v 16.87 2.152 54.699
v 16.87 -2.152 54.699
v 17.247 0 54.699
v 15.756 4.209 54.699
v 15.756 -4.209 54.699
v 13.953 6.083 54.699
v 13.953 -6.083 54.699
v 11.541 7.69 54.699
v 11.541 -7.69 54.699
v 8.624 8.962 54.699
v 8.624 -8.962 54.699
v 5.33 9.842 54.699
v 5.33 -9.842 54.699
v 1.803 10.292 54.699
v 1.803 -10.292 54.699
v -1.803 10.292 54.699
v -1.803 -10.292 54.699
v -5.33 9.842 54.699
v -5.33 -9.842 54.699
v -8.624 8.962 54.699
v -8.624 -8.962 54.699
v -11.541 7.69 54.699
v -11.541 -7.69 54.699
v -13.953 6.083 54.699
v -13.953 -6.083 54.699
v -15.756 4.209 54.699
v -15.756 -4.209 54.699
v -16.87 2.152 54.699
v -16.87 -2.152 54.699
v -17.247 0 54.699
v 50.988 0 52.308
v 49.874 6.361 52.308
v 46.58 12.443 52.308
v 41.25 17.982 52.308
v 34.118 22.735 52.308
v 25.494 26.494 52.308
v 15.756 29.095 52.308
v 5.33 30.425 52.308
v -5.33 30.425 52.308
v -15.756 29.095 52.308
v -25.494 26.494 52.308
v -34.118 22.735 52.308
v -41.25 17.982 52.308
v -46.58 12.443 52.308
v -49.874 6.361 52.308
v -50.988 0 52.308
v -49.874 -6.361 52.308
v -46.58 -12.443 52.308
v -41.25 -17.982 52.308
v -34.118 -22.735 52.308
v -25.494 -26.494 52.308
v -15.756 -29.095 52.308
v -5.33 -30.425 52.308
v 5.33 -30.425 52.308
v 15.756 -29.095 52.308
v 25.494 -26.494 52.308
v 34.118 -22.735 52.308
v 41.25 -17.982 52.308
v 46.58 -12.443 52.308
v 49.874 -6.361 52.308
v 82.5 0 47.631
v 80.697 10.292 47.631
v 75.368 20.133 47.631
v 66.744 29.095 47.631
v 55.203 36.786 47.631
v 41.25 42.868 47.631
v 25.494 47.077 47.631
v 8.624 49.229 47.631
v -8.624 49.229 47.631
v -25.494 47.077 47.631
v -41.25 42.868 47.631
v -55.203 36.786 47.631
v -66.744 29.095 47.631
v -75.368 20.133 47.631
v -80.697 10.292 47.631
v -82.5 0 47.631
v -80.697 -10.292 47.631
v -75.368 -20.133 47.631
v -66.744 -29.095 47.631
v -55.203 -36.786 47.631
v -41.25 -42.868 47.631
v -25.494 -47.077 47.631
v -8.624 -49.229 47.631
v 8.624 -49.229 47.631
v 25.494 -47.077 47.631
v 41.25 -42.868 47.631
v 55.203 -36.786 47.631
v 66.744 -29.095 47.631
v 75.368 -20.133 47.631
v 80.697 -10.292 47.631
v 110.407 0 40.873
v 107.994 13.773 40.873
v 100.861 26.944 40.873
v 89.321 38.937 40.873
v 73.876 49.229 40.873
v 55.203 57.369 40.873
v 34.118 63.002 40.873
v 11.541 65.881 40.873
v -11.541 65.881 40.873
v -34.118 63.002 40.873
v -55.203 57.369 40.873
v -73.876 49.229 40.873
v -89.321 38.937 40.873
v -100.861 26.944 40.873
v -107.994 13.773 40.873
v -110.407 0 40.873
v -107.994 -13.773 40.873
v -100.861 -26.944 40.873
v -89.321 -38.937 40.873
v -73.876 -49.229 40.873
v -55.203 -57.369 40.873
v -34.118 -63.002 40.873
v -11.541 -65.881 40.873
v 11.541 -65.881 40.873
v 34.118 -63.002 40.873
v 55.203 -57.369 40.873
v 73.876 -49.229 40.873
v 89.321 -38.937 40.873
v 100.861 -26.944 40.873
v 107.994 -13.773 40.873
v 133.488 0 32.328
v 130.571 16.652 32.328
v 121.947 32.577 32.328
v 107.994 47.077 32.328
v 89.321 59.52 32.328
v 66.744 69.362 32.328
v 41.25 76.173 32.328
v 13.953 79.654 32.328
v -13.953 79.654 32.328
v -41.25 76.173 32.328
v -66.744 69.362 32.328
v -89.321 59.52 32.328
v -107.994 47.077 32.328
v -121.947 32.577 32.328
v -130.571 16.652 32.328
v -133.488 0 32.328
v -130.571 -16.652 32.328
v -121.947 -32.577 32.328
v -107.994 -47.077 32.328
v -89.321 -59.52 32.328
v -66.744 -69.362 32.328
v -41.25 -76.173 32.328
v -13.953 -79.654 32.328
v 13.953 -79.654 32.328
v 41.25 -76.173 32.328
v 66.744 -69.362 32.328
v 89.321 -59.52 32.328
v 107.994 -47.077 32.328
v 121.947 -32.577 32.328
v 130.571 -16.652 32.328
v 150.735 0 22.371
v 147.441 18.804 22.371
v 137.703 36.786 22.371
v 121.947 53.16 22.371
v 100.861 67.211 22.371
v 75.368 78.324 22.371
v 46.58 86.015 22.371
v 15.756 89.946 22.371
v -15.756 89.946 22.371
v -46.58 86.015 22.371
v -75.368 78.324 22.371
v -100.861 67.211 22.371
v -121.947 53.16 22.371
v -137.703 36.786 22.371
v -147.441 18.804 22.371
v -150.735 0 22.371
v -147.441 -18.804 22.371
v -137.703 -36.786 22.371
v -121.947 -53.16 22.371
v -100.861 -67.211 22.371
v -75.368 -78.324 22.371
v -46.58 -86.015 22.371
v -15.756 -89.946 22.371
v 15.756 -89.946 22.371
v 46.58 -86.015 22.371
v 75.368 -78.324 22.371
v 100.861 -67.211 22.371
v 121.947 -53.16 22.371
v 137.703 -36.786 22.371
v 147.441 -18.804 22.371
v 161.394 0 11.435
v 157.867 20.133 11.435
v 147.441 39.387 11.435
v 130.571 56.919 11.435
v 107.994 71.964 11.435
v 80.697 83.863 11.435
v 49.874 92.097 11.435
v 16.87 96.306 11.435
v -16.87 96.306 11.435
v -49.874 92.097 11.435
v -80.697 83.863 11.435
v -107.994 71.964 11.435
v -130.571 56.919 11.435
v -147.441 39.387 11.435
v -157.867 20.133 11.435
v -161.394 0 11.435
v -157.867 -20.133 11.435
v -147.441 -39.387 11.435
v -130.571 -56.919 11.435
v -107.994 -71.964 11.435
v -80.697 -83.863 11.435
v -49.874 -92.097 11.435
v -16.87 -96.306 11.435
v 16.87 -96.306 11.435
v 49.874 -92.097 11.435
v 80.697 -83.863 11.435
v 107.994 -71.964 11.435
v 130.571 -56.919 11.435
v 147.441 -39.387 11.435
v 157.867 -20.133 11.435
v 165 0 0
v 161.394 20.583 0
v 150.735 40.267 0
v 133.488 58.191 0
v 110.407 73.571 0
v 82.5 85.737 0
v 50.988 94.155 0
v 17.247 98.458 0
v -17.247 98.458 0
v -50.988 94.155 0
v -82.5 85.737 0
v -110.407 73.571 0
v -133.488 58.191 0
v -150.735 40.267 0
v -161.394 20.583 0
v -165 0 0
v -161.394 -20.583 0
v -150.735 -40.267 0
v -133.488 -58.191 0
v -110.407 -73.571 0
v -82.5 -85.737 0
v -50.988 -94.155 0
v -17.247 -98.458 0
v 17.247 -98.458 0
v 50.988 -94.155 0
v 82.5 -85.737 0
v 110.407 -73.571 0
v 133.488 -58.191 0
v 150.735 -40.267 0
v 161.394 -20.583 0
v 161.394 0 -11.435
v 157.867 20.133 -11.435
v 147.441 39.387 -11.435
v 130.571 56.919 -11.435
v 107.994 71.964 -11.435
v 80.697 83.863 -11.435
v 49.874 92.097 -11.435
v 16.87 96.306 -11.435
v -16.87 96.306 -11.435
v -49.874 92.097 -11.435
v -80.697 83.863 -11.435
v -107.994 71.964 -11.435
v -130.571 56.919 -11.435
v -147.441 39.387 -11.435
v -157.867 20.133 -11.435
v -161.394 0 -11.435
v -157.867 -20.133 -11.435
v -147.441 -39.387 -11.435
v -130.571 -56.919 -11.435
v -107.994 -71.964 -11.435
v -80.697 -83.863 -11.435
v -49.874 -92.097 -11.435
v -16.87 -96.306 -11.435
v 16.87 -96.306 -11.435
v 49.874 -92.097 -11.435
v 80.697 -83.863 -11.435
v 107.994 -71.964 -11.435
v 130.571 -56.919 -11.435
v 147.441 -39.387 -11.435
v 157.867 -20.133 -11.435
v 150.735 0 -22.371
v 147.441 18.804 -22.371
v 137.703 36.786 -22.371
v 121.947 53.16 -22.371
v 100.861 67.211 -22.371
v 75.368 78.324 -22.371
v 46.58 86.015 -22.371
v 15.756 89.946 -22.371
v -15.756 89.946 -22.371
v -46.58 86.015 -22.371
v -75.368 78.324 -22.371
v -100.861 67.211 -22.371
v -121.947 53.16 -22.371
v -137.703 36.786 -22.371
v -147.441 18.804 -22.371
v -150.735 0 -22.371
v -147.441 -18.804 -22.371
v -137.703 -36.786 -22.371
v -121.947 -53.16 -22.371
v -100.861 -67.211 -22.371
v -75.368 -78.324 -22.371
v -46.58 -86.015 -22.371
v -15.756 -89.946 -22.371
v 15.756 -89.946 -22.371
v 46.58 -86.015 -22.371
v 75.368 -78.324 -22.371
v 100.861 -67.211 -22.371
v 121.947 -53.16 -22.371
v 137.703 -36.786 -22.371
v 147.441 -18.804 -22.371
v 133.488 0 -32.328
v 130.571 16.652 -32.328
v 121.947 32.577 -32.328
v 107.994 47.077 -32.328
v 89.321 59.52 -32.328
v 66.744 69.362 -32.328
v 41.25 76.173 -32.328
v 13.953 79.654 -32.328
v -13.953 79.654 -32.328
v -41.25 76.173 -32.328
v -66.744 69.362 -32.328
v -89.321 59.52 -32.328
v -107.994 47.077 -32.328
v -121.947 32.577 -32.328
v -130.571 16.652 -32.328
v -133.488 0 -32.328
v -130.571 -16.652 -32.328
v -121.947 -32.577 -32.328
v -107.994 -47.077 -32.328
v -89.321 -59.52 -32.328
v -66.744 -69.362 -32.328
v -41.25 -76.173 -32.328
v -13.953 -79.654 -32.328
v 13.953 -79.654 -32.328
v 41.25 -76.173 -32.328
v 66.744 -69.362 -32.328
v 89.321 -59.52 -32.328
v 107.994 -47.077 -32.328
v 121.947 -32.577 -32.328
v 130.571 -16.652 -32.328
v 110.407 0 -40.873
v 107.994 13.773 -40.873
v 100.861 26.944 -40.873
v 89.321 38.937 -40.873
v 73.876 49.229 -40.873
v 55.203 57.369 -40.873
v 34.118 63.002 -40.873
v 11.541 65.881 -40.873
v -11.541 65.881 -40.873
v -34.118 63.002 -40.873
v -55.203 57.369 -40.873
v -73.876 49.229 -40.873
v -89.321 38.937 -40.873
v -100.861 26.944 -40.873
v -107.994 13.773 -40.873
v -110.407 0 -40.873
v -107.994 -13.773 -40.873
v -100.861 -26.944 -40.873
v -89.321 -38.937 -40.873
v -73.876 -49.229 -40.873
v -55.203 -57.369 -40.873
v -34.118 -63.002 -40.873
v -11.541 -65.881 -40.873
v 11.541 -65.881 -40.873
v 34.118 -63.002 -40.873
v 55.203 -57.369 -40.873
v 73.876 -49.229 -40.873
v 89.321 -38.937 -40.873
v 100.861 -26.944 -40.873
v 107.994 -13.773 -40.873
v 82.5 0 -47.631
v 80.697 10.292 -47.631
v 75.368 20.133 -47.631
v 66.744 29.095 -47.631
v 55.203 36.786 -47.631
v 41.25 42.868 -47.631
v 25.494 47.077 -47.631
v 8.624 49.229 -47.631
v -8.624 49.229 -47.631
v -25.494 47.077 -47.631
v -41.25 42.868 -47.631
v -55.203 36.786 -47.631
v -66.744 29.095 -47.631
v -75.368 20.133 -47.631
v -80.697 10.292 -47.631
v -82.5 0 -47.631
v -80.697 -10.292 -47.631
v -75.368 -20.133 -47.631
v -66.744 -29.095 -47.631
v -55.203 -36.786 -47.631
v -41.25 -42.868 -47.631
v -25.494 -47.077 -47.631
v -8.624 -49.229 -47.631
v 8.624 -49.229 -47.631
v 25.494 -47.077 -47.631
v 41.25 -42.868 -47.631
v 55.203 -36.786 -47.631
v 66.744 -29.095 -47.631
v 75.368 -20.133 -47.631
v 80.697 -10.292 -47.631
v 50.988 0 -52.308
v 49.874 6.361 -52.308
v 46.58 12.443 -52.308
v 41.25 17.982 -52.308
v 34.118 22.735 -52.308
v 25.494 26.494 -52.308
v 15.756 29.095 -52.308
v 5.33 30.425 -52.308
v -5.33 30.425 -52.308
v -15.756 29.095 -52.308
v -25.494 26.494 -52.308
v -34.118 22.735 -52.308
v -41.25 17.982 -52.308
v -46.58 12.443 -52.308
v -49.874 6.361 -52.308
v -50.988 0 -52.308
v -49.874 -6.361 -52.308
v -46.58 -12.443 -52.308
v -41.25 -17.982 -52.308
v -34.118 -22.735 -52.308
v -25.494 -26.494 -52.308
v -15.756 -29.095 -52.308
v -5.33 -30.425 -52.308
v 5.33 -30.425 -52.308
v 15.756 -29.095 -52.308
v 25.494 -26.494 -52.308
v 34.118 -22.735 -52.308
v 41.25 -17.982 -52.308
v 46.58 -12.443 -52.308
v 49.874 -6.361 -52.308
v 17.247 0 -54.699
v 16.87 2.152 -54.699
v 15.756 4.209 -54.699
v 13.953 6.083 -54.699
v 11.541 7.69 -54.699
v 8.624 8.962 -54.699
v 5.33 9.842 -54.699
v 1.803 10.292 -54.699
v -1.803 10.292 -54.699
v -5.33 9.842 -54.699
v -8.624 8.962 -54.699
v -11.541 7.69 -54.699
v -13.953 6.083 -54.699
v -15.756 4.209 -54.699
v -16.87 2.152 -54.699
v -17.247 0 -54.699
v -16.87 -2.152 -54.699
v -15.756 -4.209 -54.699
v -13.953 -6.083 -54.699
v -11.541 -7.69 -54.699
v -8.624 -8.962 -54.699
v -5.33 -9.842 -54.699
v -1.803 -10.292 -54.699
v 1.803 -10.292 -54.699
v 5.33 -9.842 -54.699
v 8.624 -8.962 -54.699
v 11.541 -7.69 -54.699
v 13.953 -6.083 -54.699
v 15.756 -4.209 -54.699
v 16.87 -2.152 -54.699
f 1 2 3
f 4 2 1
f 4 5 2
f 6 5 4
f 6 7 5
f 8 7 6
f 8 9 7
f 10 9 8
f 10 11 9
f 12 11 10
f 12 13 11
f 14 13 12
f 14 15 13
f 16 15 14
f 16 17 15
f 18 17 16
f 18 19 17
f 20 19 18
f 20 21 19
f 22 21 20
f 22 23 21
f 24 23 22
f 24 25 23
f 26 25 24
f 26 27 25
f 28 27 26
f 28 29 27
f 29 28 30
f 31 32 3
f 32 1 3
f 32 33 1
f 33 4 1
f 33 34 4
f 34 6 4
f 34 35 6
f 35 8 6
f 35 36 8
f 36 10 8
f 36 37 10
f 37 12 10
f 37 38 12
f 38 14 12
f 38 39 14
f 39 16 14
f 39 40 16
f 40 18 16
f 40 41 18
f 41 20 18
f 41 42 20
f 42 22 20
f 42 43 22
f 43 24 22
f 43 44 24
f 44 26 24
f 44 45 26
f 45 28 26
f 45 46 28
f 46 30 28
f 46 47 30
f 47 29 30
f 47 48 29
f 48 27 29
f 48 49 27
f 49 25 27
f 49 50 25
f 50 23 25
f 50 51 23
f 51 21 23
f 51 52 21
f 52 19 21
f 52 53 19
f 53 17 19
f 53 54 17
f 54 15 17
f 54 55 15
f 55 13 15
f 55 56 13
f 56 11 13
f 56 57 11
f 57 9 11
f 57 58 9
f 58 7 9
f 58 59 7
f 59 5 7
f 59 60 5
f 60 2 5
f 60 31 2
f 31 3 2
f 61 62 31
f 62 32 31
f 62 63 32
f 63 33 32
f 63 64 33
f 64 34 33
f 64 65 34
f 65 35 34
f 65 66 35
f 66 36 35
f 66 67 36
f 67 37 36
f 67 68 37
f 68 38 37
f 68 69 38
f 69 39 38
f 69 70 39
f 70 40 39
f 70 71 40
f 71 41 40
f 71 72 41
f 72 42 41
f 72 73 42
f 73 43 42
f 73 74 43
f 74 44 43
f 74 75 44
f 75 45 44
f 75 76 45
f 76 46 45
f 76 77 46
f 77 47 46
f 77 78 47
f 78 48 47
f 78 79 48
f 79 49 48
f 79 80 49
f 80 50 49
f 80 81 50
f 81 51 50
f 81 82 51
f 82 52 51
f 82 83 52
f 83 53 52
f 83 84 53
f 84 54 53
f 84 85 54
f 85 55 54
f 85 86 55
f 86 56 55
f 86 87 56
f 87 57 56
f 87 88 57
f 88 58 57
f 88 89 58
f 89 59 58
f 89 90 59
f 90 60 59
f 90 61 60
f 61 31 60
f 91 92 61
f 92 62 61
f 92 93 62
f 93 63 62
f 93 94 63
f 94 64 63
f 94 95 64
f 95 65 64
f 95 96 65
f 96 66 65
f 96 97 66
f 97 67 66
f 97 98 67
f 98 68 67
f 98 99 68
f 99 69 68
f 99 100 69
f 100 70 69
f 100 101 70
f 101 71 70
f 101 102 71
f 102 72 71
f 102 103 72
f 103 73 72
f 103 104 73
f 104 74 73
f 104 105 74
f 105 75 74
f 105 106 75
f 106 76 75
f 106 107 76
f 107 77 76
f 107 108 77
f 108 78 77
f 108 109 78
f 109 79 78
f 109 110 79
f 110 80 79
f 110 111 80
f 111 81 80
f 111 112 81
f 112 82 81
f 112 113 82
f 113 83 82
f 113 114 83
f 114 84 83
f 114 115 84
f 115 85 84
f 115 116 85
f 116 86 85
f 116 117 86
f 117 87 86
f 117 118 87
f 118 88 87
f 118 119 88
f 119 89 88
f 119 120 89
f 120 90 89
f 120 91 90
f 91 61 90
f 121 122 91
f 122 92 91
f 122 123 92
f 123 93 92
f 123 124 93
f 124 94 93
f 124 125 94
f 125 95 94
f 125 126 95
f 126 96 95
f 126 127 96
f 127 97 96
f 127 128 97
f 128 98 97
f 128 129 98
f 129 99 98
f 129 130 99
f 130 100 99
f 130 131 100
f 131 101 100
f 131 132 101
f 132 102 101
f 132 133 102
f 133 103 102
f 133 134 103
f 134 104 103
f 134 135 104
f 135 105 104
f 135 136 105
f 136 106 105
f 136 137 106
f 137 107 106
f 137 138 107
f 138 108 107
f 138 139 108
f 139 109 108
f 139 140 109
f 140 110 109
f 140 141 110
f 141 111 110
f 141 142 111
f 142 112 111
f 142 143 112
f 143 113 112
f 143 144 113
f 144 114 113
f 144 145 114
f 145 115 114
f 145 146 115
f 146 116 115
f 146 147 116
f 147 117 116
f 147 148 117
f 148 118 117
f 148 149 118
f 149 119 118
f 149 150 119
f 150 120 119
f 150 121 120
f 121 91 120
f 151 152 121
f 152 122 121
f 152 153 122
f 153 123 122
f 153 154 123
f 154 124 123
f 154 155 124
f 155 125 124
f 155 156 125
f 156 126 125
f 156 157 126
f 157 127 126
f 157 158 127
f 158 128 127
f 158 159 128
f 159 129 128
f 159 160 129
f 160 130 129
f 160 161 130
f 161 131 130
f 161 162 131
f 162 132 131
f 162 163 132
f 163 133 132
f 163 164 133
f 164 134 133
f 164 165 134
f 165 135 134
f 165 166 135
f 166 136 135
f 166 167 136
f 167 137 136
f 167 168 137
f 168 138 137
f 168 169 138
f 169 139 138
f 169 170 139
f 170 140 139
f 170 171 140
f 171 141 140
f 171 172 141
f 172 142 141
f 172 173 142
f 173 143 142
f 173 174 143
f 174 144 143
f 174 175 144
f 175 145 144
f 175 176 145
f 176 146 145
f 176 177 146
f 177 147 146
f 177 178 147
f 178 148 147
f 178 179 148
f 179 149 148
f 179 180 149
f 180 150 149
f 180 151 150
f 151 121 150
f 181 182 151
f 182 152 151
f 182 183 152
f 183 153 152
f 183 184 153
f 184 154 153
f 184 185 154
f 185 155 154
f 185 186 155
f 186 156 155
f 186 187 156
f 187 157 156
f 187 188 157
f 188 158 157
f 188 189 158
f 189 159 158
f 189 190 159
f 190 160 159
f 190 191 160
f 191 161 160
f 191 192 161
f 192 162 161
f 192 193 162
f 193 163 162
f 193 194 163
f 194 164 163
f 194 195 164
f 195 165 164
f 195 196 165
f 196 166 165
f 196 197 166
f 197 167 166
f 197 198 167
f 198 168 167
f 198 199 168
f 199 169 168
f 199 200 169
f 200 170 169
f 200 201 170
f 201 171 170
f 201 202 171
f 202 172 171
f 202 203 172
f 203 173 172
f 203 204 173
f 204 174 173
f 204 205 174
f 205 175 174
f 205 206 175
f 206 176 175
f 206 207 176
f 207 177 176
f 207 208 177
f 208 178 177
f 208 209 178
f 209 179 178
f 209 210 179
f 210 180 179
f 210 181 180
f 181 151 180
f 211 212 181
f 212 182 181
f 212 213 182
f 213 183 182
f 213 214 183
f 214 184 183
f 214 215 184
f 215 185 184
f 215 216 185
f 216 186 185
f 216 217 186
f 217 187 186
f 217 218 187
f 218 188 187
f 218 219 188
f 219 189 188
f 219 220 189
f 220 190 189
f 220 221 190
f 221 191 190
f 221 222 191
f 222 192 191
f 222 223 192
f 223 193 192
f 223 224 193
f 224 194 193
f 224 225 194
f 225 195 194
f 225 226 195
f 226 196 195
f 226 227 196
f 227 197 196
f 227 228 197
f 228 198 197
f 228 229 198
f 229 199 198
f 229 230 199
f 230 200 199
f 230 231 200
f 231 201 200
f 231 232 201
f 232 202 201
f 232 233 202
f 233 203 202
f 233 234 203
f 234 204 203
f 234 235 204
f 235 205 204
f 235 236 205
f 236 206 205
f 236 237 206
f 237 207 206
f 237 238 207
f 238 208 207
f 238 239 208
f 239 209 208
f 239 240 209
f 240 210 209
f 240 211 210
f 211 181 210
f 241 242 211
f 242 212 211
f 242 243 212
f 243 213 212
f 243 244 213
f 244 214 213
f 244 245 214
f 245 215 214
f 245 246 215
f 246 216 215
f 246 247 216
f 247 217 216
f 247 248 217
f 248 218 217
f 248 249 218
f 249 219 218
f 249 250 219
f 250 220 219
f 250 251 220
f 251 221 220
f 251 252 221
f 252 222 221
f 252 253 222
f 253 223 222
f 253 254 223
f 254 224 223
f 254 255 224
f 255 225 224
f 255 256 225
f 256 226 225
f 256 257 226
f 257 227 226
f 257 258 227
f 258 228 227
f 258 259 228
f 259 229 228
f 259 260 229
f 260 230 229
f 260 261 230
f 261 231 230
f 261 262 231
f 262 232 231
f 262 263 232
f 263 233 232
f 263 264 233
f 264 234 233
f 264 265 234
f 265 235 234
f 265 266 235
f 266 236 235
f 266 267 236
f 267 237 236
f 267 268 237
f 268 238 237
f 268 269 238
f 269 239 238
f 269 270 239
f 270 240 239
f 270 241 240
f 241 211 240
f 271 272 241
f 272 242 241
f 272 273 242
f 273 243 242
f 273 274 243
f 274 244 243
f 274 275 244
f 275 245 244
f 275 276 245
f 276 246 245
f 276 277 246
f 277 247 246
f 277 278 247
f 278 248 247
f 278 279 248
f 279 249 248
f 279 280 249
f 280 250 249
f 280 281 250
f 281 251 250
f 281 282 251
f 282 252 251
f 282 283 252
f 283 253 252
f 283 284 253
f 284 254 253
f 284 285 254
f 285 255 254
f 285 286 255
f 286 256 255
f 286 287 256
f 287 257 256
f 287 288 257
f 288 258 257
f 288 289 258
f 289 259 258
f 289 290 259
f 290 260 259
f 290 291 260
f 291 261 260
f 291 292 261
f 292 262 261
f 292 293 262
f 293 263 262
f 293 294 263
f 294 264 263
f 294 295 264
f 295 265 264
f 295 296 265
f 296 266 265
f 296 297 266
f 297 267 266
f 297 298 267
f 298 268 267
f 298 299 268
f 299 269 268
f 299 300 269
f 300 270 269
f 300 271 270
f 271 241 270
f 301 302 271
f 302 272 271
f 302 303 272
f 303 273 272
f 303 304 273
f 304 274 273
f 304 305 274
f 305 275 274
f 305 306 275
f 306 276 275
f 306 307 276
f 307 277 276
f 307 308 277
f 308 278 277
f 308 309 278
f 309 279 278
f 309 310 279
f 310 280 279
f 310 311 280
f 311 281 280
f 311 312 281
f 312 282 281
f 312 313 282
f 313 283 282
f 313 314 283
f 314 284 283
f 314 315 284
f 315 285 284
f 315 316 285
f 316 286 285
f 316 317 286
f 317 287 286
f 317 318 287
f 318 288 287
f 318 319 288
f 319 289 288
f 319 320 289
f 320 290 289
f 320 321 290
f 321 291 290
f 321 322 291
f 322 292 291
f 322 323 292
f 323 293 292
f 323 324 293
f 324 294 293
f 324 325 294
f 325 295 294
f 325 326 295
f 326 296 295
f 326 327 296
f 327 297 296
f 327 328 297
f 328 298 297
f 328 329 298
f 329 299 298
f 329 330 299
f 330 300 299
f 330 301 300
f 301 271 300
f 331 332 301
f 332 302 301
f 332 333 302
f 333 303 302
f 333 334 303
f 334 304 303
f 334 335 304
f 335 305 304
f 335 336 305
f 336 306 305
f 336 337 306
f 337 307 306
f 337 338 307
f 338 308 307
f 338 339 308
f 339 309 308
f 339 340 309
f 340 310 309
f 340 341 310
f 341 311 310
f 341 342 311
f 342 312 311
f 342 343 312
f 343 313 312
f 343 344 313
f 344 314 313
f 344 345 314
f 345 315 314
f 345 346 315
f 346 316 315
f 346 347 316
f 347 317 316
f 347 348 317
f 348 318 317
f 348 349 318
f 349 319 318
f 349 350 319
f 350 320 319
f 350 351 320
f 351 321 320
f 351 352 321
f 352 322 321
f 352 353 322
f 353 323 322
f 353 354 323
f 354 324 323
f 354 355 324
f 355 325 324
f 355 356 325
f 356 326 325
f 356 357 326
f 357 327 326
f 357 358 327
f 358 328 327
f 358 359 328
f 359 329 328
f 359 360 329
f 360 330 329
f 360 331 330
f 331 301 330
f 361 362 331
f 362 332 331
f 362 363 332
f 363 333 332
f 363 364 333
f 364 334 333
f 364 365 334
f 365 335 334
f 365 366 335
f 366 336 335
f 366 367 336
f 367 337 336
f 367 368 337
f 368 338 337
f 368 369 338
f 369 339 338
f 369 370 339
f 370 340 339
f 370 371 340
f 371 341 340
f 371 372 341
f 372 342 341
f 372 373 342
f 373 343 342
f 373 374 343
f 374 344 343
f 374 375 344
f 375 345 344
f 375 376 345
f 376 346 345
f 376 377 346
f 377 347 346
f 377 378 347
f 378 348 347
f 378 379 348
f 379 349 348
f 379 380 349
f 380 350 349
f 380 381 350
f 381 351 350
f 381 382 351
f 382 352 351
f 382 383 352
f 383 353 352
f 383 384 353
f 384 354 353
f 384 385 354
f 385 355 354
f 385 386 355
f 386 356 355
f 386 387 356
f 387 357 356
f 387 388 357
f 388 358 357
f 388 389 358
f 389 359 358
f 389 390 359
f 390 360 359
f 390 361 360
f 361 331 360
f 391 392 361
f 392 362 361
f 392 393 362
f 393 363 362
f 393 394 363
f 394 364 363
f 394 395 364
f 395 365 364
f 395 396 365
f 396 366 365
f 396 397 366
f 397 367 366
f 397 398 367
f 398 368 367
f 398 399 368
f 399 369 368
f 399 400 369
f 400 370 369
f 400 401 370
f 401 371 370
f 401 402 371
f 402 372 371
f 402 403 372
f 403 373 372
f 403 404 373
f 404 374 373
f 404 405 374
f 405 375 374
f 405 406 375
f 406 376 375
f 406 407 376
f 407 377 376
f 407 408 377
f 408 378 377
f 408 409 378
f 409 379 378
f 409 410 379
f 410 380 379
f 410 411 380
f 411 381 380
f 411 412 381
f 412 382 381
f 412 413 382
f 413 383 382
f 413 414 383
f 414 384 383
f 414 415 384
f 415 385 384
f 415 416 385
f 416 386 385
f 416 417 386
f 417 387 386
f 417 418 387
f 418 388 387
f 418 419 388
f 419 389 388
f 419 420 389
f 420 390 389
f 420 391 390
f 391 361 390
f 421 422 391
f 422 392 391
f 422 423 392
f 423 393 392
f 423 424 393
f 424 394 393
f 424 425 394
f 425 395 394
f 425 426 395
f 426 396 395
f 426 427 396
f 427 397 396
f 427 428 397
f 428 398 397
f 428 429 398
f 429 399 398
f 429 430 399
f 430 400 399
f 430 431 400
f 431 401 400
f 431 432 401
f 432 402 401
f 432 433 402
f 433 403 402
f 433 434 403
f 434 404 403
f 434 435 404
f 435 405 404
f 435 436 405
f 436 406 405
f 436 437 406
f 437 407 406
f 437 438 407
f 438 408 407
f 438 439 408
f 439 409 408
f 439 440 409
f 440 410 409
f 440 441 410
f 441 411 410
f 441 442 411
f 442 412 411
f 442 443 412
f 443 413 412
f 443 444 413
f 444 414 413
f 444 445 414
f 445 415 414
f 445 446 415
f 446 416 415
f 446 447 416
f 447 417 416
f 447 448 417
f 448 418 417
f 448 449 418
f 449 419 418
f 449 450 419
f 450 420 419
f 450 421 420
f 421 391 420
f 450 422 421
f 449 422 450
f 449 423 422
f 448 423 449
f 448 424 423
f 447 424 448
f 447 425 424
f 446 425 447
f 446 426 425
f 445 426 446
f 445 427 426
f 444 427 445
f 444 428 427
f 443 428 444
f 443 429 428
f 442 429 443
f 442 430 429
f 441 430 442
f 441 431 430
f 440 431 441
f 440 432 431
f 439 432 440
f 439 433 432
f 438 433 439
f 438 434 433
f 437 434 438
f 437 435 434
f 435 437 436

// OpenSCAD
// Generated by SolidPython 1.0.1 on 2020-07-29 00:46:51


scale(v = [15, 9, 5]) {
	sphere(r = 11);
}
/***********************************************
*********      SolidPython code:      **********
************************************************
 
# import packages: SolidPython
from solid import *
from solid.utils import *
from itertools import chain, combinations, permutations


class Resize:

    def __init__(self, scad_file):
        self.scad_file = scad_file
        #self.scad_file = import_scad(scad_file)
        # cone/cylinder param:
        self.r1 = 0
        self.r2 = 0
        self.h = 0
        # rectangular prism param:
        self.w = 0
        self.l = 0
        # ellipse param:
        self.r = 0

    # import OpenScad code (file name corresponds to shape)


    # classify shape + parameters
    def assign(self, param1, param2, param3):
        if self.scad_file == 'cone.scad':
            self.r1 = param1
            self.r2 = param2
            self.h = param3
        elif self.scad_file == 'cylinder.scad':
            self.r1 = param1
            self.r2 = param2
            self.h = param3
        elif self.scad_file == 'rectangularPrism.scad':
            self.h = param1
            self.l = param2
            self.w = param3
        else:
            self.r = param1
            self.h = param2

    # resize parameters
    def iterate(self):
        x = range(3, 20, 2)
        i = 1
        if self.scad_file == 'cone.scad':
            tempList = list(permutations(x, 2))
            for temp in tempList:
                param1 = temp[0]
                param2 = temp[1]
                filepath = 'produced_scad_files/' + 'cone' + str(param1) + '_' + str(param2) + '_' + '.scad'
                scad_render_to_file(cylinder(h=param1, r1=param2, r2=0), filepath)

        elif self.scad_file == 'cylinder.scad':
            tempList = list(permutations(x, 3))
            for temp in tempList:
                param1 = temp[0]
                param2 = temp[1]
                filepath = 'produced_scad_files/' + 'cylinder' + str(param1) + '_' + str(param2) + '_' + '.scad'
                scad_render_to_file(cylinder(h=param1, r1=param2, r2=param2), filepath)

        elif self.scad_file == 'rectangularPrism.scad':
            tempList = list(permutations(x, 3))
            for temp in tempList:
                param1 = temp[0]
                param2 = temp[1]
                param3 = temp[2]
                filepath = 'produced_scad_files/' + 'rectangularPrism' + str(param1) + '_' + str(param2) + '_' + str(
                    param3) + '.scad'
                scad_render_to_file(cube(size=(param1, param2, param3)), filepath)

        elif self.scad_file == 'ellipse.scad':
            tempList = list(permutations(x, 4))
            for temp in tempList:
                param1 = temp[0]
                param2 = temp[1]
                param3 = temp[2]
                param4 = temp[3]
                filepath = 'produced_scad_files/' + 'ellipse' + str(param1) + '_' + str(param2) + '_' + str(param3) + '_' + str(param4) + '.scad'
                scad_render_to_file(scale([param1, param2, param3])(sphere(r=param4)), filepath)

    def render_to_scadfile(self):
        scad_render_to_file(scad, 'example.scad') 
 
************************************************/
